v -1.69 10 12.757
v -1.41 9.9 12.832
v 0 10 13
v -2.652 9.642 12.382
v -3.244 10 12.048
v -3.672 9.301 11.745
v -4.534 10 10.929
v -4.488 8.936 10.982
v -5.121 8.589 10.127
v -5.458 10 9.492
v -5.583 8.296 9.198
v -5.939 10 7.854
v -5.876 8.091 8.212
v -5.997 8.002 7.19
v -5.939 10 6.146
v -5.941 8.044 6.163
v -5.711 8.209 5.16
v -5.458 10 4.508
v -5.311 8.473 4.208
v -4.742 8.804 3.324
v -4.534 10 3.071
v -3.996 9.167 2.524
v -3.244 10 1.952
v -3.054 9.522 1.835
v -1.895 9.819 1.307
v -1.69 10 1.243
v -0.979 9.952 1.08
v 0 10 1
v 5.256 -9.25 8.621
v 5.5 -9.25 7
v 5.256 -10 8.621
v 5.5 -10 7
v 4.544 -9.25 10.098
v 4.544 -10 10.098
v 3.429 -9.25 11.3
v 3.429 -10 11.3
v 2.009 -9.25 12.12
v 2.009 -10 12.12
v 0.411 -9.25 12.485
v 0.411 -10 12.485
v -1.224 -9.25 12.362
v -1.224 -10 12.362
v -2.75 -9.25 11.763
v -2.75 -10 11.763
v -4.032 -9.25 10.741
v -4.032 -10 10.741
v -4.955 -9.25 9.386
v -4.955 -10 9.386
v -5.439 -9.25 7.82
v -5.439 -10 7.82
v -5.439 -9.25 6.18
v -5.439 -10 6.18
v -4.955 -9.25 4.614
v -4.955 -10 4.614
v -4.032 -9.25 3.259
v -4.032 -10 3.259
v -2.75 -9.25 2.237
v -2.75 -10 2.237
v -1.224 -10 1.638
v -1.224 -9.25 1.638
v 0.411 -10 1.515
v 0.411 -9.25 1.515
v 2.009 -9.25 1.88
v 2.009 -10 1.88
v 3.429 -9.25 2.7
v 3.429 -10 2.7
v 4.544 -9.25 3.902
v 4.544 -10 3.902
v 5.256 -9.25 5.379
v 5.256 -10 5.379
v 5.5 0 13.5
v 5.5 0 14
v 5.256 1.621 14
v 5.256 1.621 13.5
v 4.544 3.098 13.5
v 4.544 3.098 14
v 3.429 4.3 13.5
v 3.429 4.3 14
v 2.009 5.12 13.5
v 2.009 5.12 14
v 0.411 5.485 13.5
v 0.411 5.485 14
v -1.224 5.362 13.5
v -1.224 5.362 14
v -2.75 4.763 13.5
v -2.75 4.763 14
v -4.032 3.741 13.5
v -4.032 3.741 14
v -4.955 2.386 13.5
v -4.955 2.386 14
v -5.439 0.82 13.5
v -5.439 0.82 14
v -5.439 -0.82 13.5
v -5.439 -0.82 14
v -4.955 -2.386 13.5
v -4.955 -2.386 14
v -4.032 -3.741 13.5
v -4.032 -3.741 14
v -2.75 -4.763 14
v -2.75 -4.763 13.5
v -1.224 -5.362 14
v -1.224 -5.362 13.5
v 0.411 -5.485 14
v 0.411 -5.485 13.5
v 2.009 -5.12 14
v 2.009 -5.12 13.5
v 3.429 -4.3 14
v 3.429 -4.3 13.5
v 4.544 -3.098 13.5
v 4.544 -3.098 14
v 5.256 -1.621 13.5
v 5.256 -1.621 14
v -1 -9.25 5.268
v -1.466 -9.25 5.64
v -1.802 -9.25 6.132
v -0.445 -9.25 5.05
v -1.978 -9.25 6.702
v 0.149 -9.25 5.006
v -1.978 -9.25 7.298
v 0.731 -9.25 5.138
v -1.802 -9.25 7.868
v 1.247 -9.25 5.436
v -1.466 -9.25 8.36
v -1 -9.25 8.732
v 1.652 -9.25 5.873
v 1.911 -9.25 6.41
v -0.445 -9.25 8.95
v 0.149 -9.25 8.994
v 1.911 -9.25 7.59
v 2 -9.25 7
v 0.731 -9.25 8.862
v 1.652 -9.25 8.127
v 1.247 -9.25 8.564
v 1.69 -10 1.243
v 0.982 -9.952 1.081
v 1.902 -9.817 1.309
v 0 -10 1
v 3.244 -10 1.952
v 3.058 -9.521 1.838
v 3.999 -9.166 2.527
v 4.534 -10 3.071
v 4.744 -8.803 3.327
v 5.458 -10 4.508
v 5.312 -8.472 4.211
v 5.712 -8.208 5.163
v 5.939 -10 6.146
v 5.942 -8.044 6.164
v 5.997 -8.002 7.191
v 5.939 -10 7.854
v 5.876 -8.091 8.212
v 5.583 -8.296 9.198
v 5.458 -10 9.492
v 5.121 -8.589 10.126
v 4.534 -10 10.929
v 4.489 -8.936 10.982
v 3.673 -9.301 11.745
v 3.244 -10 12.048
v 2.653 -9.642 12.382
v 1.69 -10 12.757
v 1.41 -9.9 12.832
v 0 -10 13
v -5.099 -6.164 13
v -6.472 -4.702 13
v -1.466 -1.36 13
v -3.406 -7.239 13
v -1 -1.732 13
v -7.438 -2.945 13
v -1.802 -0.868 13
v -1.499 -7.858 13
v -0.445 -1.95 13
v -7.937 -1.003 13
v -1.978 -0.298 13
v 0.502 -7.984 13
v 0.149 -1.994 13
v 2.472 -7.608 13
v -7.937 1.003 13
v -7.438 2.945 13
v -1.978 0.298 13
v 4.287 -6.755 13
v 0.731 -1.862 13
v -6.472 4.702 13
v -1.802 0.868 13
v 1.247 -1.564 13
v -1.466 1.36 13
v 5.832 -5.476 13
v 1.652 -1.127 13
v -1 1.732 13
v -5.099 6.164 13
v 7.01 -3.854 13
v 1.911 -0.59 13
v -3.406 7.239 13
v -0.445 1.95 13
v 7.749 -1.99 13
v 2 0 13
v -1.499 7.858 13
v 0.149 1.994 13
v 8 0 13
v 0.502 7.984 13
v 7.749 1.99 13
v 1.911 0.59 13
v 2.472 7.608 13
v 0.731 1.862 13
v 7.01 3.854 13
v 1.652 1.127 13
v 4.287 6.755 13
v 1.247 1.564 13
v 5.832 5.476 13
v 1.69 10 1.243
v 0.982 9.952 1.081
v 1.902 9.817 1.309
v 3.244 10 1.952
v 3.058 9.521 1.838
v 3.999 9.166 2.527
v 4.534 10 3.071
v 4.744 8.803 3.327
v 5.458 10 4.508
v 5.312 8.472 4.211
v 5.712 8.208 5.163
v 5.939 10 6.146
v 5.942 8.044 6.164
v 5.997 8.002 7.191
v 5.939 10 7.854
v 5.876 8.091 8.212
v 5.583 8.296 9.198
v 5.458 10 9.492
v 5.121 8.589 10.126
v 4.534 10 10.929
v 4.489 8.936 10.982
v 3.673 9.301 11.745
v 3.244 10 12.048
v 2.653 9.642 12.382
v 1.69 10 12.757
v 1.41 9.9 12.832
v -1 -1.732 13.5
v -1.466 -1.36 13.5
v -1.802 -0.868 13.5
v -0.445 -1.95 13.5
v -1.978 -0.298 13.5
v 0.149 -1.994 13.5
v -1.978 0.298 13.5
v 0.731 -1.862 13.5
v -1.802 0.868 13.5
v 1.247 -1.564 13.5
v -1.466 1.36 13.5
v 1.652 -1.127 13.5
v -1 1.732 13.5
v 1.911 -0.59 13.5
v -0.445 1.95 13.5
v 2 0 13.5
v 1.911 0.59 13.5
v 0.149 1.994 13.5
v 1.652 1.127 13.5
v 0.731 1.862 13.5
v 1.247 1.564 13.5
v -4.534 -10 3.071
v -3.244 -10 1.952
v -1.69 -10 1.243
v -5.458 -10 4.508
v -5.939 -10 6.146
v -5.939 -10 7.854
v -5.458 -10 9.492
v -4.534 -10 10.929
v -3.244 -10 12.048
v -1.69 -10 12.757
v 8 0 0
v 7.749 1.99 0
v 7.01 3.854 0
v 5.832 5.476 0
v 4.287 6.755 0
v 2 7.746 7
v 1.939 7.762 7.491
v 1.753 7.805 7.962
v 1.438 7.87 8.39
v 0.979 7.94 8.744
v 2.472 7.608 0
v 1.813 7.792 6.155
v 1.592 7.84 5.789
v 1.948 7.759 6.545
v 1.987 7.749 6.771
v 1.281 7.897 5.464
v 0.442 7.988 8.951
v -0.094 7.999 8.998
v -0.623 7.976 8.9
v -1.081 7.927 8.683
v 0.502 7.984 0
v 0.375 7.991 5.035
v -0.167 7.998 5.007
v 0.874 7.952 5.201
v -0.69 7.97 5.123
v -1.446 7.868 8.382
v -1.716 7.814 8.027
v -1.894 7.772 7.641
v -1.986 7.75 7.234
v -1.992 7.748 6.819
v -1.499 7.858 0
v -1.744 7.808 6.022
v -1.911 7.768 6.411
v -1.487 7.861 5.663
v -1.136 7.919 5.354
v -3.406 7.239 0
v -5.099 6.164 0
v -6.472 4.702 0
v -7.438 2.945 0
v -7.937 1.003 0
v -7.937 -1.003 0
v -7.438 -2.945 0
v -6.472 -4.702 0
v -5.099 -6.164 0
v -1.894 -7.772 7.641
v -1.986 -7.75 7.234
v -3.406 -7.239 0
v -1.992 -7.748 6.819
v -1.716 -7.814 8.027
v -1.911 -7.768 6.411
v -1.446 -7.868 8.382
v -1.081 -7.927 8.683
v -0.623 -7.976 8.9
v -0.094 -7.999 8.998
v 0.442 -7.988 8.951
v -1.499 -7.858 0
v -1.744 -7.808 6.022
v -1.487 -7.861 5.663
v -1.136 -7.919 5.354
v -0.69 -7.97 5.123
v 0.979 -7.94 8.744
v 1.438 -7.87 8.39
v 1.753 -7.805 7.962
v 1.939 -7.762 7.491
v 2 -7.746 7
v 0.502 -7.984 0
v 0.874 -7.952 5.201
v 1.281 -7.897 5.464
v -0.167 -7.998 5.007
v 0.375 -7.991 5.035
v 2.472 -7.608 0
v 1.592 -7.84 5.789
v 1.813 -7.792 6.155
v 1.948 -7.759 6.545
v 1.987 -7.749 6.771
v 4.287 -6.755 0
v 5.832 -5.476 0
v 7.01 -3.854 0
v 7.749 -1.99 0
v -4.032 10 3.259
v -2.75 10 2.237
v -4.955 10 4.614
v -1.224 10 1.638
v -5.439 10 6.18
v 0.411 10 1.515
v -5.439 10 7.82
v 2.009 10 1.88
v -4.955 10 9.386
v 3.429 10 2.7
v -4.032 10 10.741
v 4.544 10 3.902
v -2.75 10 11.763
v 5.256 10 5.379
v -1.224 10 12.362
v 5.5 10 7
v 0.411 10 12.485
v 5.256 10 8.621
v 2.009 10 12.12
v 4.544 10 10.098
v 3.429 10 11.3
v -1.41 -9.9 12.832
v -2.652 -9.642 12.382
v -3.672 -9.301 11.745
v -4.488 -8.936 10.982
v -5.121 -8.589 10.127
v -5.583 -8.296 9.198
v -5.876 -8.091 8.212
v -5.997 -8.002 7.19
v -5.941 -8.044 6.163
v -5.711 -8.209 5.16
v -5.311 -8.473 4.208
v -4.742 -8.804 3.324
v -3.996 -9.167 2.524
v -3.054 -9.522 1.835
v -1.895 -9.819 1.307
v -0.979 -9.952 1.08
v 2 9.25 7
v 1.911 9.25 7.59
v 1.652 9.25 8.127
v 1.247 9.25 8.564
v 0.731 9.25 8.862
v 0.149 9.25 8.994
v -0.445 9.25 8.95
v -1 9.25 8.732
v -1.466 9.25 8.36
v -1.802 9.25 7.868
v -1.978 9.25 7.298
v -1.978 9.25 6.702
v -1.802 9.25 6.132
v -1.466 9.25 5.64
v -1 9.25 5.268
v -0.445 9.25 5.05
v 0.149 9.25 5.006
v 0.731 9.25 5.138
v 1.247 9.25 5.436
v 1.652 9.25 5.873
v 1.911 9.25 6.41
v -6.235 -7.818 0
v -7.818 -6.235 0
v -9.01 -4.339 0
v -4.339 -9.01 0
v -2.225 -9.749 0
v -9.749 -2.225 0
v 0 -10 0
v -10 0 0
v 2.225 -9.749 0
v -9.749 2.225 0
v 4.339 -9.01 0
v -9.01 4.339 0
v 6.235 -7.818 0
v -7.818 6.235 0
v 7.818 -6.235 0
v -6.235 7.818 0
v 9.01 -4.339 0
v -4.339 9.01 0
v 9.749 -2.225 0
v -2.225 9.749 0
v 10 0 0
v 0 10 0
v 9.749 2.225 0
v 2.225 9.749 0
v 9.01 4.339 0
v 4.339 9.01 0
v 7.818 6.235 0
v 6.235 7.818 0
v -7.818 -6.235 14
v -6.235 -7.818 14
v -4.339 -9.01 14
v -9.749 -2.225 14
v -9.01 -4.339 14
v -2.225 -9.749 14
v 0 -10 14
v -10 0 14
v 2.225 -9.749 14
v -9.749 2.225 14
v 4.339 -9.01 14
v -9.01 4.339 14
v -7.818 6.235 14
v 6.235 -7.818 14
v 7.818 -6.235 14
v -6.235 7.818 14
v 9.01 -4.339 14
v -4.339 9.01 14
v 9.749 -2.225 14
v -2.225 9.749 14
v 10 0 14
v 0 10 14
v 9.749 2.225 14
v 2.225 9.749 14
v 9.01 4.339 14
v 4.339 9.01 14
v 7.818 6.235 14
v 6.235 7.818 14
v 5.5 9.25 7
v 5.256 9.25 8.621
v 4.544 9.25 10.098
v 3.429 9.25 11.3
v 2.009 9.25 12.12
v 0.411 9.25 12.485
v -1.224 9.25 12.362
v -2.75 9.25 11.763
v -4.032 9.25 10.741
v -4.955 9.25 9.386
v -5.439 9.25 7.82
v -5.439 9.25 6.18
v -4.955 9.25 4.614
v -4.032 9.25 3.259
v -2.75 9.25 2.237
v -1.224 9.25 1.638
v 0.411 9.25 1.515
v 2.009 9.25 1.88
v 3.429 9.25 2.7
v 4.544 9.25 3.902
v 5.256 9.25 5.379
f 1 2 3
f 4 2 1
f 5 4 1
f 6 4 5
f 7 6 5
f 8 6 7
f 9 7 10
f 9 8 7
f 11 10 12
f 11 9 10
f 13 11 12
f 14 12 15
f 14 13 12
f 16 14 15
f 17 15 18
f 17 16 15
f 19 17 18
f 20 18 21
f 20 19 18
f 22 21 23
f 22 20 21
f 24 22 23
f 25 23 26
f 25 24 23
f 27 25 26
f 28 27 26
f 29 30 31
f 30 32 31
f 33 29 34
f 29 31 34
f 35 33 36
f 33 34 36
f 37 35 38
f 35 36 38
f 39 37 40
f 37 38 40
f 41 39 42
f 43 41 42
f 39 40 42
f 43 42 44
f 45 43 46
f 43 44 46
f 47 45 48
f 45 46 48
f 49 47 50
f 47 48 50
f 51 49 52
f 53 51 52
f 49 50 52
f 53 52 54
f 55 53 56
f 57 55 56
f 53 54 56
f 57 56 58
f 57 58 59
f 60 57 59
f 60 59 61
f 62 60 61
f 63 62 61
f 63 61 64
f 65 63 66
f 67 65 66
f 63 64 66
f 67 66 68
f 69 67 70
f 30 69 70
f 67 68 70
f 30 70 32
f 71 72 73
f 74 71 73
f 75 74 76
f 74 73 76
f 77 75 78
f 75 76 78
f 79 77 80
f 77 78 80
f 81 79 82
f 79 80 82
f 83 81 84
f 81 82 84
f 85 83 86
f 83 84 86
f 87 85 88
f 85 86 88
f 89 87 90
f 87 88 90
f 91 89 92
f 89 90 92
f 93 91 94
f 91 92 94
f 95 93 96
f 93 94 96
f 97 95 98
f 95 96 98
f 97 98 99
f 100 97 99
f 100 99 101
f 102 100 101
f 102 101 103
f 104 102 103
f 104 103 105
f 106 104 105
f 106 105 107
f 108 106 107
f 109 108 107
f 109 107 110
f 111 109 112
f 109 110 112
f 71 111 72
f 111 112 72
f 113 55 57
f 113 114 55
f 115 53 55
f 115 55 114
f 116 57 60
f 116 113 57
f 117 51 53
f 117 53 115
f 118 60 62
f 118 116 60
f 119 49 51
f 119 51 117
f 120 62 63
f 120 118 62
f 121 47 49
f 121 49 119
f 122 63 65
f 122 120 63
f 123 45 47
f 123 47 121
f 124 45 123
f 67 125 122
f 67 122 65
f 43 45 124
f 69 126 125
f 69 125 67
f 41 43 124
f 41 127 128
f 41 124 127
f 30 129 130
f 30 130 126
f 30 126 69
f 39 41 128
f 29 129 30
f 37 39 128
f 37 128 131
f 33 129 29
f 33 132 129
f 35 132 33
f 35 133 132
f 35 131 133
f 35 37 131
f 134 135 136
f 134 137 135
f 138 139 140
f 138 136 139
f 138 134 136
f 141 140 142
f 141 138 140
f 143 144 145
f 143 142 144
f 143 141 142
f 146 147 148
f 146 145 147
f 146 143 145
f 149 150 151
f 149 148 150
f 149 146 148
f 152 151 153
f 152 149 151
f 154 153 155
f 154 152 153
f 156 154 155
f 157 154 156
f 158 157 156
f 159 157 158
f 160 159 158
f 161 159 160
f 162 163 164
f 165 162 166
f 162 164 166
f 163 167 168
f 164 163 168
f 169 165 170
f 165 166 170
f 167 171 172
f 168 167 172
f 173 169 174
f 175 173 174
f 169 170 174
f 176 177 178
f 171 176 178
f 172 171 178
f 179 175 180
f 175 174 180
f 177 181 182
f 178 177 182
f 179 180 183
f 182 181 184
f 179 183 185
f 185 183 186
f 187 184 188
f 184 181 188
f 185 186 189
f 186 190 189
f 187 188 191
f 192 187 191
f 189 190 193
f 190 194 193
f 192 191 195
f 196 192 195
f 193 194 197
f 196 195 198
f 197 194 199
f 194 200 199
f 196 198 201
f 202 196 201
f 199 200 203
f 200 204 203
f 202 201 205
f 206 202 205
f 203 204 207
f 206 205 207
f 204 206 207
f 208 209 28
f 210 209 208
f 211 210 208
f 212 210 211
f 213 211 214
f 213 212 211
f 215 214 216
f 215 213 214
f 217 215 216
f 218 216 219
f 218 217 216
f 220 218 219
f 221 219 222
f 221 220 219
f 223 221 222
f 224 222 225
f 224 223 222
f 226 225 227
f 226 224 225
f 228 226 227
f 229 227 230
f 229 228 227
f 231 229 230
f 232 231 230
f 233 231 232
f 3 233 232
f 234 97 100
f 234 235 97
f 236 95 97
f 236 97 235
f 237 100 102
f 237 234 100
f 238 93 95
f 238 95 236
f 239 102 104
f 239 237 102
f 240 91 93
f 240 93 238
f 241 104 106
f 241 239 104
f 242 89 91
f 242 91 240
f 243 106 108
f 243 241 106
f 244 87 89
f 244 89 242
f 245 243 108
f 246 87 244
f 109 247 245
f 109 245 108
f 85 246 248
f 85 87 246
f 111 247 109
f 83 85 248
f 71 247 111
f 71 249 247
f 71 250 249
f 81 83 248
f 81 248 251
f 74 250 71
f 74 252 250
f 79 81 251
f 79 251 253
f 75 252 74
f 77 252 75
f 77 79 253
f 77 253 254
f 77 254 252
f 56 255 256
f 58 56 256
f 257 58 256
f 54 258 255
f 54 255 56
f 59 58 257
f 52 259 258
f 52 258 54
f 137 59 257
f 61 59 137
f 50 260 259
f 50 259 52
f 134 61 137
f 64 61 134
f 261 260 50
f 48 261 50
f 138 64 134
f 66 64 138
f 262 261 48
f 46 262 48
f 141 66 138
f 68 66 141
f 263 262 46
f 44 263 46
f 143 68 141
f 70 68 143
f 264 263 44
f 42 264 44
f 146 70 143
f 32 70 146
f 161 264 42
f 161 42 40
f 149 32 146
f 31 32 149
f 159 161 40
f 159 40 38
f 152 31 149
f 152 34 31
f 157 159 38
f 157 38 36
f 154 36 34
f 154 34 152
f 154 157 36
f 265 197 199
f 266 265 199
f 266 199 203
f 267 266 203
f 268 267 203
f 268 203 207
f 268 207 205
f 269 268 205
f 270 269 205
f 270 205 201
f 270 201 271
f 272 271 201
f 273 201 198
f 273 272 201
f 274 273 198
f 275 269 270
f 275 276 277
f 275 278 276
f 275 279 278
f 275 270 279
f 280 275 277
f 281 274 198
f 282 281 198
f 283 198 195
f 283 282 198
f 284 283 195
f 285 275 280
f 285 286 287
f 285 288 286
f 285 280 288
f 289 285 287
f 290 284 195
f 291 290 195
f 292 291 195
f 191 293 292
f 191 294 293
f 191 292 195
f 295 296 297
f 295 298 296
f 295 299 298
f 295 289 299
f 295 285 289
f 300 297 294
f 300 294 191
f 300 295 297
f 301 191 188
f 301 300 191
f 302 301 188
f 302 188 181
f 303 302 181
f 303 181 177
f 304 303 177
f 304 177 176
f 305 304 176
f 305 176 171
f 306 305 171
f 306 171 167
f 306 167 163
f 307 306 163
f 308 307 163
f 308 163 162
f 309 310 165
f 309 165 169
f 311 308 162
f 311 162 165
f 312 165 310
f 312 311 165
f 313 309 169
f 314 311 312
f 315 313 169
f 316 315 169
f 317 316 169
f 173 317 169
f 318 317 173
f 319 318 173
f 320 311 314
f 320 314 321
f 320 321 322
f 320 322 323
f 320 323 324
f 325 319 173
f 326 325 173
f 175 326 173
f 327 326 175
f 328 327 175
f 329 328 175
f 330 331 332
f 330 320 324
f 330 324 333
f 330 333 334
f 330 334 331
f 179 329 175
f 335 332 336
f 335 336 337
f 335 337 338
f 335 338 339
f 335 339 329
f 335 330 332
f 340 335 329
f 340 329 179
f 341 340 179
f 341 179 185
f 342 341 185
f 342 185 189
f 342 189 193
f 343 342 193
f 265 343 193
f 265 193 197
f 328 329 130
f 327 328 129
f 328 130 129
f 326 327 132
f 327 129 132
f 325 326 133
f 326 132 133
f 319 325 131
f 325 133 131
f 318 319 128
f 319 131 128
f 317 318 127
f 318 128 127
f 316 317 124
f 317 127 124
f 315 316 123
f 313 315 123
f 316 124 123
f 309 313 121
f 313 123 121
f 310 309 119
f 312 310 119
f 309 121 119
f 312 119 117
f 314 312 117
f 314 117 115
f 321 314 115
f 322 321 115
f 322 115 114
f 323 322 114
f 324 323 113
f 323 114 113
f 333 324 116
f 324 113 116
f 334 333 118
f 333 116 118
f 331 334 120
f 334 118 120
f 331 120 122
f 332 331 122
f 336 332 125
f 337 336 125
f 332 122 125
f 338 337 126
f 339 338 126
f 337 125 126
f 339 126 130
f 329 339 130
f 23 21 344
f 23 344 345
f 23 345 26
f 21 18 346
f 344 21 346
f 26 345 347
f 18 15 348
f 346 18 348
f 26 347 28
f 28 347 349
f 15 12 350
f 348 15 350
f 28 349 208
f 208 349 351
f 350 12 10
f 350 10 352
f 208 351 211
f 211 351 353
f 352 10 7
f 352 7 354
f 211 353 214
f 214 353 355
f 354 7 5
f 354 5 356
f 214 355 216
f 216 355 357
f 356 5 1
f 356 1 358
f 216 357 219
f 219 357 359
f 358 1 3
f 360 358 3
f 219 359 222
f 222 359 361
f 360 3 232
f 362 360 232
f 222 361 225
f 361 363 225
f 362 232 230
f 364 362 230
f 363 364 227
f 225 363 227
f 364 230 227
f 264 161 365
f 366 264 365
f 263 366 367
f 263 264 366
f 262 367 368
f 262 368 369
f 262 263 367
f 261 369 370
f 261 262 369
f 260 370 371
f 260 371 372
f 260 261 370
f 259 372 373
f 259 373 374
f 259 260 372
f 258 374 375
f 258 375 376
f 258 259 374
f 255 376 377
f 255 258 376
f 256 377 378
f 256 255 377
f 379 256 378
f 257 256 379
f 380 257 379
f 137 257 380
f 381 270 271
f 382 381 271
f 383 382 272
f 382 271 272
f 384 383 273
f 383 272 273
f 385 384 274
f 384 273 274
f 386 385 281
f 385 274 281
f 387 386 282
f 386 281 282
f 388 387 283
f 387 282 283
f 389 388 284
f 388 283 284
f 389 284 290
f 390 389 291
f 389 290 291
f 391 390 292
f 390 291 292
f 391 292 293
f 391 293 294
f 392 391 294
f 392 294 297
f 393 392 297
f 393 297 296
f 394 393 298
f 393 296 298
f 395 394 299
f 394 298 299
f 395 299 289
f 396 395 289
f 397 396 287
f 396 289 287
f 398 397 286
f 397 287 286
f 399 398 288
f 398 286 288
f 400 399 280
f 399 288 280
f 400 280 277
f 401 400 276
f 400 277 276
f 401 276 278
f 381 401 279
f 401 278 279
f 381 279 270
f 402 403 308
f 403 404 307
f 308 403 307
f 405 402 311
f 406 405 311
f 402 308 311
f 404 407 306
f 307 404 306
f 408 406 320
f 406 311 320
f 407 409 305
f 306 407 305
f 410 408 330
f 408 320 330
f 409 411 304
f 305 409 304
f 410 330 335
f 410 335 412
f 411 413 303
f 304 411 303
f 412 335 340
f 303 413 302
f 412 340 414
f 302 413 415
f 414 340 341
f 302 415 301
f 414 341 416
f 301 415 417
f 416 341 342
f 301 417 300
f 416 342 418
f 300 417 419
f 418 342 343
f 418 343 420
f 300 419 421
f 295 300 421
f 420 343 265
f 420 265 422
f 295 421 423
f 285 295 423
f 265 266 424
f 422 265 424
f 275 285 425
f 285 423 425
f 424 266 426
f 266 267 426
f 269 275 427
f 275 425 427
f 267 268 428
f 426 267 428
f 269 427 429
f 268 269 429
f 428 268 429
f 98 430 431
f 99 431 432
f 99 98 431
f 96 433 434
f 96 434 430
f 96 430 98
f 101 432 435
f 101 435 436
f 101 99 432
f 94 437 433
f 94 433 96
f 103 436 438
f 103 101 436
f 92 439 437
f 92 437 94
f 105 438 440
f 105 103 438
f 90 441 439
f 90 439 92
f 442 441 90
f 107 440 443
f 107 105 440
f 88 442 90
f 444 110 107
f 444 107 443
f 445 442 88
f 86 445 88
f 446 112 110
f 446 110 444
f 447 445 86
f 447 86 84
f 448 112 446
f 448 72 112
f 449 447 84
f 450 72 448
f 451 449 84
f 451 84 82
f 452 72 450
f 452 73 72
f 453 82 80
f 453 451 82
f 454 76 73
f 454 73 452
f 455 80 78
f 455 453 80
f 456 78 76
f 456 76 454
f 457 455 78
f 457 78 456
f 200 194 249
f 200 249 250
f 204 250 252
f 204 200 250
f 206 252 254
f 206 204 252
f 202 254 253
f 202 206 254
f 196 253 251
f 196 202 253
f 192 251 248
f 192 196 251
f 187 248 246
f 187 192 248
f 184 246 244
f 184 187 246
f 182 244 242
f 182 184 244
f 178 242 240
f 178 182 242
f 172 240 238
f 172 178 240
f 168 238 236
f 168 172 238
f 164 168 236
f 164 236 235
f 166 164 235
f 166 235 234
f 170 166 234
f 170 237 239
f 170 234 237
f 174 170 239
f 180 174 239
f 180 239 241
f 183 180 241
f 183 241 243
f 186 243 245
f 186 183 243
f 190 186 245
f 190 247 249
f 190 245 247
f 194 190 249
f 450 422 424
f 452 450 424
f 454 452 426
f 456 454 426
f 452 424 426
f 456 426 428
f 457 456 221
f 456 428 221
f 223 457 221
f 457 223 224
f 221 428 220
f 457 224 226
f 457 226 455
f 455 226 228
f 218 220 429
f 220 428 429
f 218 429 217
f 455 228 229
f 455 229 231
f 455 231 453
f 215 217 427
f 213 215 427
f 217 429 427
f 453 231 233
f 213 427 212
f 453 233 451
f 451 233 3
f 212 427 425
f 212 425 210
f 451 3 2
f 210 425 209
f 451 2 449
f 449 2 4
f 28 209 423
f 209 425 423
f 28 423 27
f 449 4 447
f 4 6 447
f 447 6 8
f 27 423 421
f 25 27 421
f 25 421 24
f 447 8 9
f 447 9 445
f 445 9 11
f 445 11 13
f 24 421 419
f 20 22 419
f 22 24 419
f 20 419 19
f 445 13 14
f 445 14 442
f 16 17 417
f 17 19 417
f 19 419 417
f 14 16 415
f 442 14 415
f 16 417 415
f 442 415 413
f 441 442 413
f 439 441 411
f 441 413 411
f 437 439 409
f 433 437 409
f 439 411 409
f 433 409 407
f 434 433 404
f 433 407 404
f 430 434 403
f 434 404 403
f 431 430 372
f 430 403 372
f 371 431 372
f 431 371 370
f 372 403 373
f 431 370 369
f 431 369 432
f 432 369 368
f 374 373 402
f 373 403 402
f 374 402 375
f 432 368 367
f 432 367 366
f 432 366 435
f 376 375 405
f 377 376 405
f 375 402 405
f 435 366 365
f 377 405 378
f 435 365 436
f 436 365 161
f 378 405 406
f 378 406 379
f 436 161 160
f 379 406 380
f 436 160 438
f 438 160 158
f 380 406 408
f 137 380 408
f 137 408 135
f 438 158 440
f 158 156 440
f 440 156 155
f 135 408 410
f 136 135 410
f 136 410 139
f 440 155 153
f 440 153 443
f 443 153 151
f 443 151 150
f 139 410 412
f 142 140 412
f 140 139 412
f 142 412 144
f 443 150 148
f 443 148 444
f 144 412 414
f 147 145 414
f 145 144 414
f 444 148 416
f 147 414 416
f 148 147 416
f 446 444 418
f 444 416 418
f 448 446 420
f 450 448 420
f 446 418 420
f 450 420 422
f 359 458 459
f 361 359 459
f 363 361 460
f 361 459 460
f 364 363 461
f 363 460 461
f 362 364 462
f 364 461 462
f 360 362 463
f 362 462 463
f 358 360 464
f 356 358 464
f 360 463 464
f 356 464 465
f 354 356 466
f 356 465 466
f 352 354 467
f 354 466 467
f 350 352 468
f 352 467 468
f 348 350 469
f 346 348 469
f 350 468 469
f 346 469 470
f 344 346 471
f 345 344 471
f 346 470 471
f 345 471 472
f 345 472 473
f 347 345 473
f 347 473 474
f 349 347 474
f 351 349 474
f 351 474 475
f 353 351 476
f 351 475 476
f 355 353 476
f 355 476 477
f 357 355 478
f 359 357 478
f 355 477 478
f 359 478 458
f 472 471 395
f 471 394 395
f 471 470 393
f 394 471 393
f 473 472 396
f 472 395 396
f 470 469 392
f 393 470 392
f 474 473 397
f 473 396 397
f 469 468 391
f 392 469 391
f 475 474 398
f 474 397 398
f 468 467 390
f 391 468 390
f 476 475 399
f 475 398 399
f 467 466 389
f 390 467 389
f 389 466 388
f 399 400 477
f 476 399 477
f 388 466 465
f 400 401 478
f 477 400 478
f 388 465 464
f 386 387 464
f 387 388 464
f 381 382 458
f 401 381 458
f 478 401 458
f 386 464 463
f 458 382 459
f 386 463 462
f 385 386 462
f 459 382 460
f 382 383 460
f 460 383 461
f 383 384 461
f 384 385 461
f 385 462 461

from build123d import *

# Parameters (mm, degrees)
F0_R      = 10
F1_DEPTH  = 14
F2_R      = 6
F3_DEPTH  = 10
F4_R      = 5.5
F5_DEPTH  = 12.5
F6_DEPTH  = 9.25
F7_R      = 2
F8_DEPTH  = 12.5
F9_R      = 8
F10_DEPTH = 13
F11_R     = 5.5
F12_DEPTH = 0.5
F13_R     = 2
F14_DEPTH = 25


with BuildPart() as f1:
    # F0 (on Top) → F1 (new body)
    with BuildSketch(Plane.XY):
        Circle(F0_R)
    extrude(amount=F1_DEPTH)

    # F2 (on Front) → F3 (join, symmetric)
    with BuildSketch(Plane.XZ):
        with Locations((0, 7)):
            Circle(F2_R)
    extrude(amount=F3_DEPTH, both=True)

    # F4 (on Front) → F5 (cut, symmetric)
    with BuildSketch(Plane.XZ):
        with Locations((0, 7)):
            Circle(F4_R)
    extrude(amount=F5_DEPTH, both=True, mode=Mode.SUBTRACT)

    # F4 (on Front) → F6 (join, symmetric)
    with BuildSketch(Plane.XZ):
        with Locations((0, 7)):
            Circle(F4_R)
    extrude(amount=F6_DEPTH, both=True)

    # F7 (on Front) → F8 (cut, symmetric)
    with BuildSketch(Plane.XZ):
        with Locations((0, 7)):
            Circle(F7_R)
    extrude(amount=F8_DEPTH, both=True, mode=Mode.SUBTRACT)

    # F9 (on Top) → F10 (cut)
    with BuildSketch(Plane.XY):
        Circle(F9_R)
    extrude(amount=F10_DEPTH, mode=Mode.SUBTRACT)

    # F11 (on face) → F12 (cut)
    with BuildSketch(Plane.XY.offset(14)):
        Circle(F11_R)
    extrude(amount=-F12_DEPTH, mode=Mode.SUBTRACT)

    # F13 (on Top) → F14 (cut)
    with BuildSketch(Plane.XY):
        Circle(F13_R)
    extrude(amount=F14_DEPTH, mode=Mode.SUBTRACT)


solid = f1.part
